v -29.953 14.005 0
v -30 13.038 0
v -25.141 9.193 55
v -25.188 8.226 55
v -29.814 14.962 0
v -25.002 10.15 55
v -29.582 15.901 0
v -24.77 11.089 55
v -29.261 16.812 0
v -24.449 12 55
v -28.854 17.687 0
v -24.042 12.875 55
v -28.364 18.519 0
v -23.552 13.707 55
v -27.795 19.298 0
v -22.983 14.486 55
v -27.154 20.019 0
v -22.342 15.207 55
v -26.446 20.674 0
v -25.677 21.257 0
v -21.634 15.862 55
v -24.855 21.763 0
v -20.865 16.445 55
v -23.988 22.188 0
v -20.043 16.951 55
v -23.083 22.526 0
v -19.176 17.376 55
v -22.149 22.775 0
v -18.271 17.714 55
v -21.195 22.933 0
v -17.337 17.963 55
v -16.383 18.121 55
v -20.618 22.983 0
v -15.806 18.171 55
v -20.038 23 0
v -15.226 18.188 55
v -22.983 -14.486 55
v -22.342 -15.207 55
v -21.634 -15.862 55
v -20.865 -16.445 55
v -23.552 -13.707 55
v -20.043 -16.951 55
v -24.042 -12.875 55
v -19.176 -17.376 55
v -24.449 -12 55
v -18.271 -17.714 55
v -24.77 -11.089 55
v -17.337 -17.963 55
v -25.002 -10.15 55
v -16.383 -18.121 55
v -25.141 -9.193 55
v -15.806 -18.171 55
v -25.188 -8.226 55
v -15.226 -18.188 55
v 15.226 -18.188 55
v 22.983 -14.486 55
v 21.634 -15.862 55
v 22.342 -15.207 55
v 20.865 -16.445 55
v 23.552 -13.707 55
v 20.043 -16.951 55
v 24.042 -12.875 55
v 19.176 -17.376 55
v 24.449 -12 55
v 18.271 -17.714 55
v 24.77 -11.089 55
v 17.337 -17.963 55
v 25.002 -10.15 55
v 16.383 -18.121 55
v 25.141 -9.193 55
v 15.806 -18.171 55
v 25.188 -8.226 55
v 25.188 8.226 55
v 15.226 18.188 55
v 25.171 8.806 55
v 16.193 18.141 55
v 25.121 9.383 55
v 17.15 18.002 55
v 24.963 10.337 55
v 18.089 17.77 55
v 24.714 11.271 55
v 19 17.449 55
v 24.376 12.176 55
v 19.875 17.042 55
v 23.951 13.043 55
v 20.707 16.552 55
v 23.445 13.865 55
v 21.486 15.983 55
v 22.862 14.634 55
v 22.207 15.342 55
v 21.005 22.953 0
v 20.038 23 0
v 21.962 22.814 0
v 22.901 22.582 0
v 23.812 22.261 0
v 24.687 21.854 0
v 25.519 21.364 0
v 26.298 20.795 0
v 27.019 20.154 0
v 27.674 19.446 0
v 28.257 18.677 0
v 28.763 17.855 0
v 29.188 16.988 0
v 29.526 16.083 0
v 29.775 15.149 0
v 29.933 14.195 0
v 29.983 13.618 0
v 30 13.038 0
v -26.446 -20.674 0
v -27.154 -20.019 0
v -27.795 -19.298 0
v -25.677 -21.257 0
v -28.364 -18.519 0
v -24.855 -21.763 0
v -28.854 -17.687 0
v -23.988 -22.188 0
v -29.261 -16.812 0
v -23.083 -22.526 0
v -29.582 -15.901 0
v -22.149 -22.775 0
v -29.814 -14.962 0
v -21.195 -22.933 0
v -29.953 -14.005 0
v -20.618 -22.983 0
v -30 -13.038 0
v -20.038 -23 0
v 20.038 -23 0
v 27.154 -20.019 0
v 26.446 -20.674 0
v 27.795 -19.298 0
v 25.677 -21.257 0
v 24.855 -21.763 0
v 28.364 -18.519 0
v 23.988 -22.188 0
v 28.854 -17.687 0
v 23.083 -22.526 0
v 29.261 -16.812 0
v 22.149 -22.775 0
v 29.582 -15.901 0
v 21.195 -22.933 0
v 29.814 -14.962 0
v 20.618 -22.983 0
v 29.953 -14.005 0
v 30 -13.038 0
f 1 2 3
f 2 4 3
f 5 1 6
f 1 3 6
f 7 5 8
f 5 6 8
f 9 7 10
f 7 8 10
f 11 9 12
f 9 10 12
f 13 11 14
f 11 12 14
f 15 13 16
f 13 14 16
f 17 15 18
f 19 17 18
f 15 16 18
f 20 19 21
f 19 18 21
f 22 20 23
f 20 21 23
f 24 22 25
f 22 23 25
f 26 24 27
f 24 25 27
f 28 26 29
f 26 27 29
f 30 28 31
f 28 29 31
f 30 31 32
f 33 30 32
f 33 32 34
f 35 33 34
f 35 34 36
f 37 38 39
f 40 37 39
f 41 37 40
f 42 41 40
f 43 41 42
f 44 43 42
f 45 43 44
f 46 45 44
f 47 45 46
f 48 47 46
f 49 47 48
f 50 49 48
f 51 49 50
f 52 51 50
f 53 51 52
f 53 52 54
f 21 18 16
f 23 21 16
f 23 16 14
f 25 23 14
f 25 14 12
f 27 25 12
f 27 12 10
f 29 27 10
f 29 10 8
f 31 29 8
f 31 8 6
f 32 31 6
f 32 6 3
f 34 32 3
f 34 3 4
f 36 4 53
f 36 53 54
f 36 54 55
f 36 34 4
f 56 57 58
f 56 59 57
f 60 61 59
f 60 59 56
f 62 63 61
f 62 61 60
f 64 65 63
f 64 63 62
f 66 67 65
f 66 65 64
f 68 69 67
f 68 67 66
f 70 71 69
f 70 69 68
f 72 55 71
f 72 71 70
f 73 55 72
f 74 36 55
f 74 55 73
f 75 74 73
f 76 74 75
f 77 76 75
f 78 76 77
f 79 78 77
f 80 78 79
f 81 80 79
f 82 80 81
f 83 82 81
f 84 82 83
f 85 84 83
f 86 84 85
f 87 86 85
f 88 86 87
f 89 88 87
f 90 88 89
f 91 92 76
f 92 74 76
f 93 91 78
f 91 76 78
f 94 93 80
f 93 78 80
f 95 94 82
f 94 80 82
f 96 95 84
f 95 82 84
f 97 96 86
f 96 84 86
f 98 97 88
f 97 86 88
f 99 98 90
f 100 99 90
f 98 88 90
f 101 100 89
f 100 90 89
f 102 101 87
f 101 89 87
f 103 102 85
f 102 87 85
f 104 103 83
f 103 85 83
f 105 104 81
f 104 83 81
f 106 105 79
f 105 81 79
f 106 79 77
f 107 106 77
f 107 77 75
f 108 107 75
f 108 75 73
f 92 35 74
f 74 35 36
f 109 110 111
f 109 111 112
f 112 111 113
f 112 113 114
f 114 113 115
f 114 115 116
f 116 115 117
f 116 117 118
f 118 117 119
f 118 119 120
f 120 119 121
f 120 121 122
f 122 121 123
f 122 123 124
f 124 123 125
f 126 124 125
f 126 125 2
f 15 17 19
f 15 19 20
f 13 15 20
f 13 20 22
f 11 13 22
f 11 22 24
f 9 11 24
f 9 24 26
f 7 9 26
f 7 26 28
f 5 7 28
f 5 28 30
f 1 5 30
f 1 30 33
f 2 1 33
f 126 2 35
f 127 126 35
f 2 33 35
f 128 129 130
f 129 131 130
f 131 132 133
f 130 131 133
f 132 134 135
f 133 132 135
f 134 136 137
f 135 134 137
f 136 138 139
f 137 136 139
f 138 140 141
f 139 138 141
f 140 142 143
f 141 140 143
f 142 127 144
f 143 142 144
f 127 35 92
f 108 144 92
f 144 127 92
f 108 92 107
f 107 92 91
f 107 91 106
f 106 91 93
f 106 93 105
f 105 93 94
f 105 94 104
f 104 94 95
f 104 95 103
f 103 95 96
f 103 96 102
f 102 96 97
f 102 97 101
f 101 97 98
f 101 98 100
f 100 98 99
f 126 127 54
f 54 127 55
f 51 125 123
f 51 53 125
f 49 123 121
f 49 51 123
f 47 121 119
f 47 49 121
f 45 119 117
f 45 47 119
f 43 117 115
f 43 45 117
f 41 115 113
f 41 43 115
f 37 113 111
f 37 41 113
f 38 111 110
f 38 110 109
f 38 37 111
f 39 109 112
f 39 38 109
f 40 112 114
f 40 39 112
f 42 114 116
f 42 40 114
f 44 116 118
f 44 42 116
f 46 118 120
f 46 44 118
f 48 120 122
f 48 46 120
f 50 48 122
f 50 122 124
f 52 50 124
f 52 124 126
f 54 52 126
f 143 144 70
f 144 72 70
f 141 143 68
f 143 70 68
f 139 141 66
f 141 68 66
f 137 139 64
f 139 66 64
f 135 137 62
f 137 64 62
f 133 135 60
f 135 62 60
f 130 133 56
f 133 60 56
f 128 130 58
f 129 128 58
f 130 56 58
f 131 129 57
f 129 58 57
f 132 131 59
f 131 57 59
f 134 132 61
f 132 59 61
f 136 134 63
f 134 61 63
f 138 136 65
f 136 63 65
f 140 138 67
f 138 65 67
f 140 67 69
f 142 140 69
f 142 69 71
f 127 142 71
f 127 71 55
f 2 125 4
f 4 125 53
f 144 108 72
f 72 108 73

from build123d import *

# Parameters (mm, degrees)
F0_W     = 60
F0_H     = 46
F1_DEPTH = 55
F1_TAPER = 5
F2_R     = 10


with BuildPart() as f1:
    # F0 (on Top) → F1 (new body)
    with BuildSketch(Plane.XY):
        Rectangle(F0_W, F0_H)
    extrude(amount=F1_DEPTH, taper=F1_TAPER)

    # F2
    f2_edges = [f1.edges().sort_by_distance(p)[0] for p in [
        (-27.594061, -20.594061, 27.500005),
        (27.594062, -20.594062, 27.5),
        (-27.594062, 20.594062, 27.5),
        (27.594061, 20.594061, 27.500005),
    ]]
    fillet(f2_edges, radius=F2_R)


solid = f1.part
